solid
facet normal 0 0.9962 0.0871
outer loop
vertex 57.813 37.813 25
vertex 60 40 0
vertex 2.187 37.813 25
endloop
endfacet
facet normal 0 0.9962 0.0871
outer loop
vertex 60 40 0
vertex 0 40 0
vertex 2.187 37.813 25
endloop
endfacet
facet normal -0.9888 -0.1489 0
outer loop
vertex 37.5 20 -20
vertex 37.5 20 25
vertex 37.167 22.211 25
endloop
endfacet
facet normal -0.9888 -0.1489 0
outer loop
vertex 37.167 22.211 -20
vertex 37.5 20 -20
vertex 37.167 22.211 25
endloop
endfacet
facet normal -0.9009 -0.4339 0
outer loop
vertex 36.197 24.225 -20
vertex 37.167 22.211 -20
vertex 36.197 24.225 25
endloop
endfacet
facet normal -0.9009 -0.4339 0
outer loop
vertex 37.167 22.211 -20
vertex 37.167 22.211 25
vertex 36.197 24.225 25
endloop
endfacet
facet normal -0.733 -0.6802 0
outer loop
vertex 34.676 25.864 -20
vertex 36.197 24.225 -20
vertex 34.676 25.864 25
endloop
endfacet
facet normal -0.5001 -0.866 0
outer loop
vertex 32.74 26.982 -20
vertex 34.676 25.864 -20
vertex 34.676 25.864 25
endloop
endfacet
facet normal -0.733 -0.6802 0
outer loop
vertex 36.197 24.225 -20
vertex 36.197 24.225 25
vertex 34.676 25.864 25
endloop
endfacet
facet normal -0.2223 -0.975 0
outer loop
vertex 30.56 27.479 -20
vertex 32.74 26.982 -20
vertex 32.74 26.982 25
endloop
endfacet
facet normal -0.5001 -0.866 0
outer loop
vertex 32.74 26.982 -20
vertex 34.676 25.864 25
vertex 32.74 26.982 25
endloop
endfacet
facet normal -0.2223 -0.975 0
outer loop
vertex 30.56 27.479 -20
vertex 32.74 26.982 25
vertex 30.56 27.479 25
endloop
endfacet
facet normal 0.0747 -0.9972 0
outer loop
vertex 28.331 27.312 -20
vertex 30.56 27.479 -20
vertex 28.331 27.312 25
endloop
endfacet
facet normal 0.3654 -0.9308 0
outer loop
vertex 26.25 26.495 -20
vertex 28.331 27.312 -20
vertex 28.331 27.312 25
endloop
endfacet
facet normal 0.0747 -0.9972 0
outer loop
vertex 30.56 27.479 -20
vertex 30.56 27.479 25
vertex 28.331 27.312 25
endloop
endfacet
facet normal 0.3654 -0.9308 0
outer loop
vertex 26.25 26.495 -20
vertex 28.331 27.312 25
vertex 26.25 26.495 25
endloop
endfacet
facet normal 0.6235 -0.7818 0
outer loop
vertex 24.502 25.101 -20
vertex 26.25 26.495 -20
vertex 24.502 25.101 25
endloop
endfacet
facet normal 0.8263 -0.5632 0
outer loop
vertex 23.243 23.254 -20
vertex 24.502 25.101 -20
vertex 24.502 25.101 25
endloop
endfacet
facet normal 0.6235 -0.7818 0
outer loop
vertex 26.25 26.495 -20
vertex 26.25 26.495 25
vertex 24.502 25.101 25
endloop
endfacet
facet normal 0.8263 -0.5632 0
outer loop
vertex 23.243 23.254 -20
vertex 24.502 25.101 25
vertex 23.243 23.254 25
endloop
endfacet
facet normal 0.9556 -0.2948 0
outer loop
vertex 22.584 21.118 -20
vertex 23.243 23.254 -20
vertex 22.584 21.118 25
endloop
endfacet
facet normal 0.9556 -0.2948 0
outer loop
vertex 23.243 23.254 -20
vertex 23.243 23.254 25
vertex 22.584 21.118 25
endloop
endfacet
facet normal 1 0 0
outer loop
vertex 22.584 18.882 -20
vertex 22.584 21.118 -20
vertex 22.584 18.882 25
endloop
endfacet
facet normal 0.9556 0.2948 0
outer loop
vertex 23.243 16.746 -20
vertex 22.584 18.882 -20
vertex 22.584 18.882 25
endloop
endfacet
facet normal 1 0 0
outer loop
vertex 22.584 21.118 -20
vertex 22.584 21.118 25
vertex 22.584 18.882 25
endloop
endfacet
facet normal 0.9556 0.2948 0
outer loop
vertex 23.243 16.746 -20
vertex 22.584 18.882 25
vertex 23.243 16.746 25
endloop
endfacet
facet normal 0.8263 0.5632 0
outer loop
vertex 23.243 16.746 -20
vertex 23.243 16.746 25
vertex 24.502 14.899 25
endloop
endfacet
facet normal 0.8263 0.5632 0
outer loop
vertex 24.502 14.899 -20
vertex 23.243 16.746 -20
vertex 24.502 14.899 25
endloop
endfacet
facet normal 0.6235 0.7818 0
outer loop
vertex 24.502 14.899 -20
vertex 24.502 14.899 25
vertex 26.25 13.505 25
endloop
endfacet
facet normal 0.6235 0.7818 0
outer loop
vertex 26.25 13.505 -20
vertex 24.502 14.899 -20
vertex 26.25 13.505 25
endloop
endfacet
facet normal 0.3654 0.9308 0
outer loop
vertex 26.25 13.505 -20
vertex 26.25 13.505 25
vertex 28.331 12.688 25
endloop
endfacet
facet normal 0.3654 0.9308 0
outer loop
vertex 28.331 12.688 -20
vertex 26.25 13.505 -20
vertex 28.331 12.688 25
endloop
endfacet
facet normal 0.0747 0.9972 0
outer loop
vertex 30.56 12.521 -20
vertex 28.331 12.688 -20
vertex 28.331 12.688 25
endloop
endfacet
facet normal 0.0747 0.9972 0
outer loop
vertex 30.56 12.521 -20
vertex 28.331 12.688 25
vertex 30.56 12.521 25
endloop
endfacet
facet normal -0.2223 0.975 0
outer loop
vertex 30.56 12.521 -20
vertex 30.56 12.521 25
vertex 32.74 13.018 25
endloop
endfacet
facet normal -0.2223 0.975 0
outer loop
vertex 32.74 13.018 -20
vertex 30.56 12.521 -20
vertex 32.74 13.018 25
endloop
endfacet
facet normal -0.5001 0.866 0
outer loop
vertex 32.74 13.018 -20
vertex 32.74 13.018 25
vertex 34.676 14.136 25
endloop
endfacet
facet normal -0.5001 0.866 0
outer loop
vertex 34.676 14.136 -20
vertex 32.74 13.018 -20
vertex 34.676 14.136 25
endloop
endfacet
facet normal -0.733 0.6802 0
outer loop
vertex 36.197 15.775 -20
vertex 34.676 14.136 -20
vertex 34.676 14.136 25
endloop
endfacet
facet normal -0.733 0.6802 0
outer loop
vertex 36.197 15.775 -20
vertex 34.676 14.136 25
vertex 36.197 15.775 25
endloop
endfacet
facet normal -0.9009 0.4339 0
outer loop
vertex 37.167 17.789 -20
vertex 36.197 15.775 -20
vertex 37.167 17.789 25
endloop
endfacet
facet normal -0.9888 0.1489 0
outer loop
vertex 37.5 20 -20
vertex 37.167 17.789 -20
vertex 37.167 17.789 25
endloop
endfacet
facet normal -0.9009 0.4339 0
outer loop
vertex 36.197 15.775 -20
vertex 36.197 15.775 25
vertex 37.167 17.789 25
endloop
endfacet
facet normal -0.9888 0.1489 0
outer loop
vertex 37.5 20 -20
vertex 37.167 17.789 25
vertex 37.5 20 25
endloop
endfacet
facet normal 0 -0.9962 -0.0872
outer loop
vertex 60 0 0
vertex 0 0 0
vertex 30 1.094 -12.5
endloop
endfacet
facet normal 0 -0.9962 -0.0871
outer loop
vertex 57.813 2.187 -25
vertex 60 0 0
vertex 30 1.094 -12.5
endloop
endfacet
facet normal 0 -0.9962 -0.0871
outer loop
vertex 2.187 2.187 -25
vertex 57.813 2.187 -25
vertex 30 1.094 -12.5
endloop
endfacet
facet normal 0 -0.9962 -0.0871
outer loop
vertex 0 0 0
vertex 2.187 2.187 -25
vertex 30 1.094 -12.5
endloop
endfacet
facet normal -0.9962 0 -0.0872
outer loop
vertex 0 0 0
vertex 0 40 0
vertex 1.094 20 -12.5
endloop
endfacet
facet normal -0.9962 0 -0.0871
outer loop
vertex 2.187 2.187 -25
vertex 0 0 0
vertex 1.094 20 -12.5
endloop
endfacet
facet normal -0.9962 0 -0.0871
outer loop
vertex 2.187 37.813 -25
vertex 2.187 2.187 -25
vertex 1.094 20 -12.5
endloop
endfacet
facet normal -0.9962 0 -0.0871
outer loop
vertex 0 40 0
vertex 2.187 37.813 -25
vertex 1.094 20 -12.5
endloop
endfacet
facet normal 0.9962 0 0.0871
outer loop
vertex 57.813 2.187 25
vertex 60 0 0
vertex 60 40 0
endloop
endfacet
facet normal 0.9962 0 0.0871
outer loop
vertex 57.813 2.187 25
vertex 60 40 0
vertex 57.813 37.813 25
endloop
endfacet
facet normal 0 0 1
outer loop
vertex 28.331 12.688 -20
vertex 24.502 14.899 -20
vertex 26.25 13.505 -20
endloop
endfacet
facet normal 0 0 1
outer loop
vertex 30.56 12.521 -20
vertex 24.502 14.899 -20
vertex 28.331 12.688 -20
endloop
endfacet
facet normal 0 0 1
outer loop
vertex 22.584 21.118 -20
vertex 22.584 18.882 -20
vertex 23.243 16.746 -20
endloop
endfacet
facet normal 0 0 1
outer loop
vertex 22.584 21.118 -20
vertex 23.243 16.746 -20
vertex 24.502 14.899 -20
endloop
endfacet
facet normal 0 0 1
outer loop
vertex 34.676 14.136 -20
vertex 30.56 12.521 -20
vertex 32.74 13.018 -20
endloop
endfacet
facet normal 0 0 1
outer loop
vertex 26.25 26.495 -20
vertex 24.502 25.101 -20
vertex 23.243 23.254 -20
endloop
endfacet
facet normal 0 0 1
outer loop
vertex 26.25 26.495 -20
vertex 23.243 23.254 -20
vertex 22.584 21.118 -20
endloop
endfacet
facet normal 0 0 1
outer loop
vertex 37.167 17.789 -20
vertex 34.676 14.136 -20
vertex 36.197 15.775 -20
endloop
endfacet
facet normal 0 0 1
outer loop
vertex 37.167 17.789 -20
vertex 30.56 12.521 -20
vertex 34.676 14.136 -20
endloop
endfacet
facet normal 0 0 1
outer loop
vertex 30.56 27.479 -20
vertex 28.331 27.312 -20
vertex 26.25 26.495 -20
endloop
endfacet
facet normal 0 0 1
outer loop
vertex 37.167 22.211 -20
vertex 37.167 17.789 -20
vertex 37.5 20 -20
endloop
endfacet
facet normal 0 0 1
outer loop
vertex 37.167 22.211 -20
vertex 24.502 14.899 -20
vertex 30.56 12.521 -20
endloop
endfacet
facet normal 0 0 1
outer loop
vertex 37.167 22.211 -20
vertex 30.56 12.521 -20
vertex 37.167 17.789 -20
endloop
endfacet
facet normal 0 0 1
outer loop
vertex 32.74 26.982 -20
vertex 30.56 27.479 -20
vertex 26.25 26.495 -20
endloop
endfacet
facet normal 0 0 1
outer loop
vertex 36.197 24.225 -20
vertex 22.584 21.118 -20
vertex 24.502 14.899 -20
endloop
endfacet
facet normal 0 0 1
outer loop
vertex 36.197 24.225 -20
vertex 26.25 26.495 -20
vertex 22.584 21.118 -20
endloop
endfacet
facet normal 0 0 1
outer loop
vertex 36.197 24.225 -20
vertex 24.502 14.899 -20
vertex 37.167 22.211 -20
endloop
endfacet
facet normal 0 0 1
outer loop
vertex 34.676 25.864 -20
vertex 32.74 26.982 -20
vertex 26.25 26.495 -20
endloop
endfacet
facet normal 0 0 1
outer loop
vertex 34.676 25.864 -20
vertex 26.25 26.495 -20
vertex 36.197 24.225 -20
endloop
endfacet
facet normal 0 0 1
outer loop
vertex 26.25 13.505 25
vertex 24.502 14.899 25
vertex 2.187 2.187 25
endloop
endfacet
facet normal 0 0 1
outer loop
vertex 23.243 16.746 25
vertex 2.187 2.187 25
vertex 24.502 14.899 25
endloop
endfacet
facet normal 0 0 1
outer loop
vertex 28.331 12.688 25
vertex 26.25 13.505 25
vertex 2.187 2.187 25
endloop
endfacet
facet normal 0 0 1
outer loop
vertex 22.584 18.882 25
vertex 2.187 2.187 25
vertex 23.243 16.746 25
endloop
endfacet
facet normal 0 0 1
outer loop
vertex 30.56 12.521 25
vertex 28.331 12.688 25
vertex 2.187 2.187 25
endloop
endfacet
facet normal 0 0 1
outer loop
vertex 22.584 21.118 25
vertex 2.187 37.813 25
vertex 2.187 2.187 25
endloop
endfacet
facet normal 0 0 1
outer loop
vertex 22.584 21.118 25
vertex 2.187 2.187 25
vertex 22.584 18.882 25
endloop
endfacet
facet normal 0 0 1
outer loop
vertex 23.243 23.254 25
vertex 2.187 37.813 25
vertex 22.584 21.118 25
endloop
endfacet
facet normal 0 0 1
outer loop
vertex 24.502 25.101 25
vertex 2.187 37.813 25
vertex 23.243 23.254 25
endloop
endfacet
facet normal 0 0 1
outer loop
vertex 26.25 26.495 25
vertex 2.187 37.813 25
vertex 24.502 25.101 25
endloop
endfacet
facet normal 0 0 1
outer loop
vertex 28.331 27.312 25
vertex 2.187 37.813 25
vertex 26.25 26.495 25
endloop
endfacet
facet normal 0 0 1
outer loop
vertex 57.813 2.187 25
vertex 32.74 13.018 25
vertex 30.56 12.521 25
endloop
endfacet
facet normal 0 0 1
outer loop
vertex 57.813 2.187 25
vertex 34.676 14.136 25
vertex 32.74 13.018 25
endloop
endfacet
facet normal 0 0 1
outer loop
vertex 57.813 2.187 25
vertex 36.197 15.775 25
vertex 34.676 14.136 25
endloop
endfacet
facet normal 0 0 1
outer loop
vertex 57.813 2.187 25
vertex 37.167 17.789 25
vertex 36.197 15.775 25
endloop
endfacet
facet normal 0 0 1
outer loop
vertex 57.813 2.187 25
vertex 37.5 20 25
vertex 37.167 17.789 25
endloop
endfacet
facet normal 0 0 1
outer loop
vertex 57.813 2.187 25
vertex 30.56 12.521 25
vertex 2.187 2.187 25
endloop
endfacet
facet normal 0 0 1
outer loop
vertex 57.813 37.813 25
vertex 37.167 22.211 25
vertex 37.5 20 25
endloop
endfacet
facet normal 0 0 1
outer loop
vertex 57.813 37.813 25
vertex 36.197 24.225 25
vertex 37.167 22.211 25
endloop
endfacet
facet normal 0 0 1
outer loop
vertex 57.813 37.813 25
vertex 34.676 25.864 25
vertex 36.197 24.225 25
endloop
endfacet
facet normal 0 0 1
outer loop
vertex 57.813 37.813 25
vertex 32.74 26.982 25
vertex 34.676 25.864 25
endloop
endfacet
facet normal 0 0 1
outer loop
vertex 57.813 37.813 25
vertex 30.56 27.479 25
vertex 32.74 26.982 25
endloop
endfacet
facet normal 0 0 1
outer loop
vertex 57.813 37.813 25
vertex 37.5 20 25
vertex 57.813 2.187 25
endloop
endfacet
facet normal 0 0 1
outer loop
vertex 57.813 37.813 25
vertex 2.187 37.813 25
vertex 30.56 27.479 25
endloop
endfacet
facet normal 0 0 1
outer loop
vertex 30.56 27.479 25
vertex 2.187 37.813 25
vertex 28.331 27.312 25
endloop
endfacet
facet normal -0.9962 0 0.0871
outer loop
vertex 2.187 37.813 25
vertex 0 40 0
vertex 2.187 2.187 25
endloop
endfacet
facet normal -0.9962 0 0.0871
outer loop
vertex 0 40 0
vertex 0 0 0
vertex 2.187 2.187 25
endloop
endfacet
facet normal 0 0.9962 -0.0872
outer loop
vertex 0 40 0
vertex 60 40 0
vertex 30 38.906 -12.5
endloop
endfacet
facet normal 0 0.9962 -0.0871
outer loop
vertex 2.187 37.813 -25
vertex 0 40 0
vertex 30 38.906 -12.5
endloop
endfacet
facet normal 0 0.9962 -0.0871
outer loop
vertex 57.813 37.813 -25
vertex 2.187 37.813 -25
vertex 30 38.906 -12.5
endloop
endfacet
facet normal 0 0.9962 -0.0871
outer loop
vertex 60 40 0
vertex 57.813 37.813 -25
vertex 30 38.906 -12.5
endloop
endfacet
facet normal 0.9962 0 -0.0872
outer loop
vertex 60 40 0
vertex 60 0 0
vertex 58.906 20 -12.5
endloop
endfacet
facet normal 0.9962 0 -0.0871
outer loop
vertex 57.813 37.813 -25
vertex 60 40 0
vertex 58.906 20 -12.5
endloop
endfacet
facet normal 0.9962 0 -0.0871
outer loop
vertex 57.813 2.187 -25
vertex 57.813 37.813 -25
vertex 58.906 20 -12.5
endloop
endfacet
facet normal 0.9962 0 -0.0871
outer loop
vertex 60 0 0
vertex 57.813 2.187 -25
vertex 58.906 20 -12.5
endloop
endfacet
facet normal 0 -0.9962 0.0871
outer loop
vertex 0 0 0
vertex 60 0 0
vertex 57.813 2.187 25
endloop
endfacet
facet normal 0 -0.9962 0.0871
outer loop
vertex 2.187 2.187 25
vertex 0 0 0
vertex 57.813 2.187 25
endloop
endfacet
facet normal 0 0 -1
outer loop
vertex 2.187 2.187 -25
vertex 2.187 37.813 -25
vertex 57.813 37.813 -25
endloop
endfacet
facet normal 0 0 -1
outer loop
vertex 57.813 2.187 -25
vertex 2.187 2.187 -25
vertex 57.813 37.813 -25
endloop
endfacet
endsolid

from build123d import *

# Parameters (mm, degrees)
F0_W          = 60
F0_H          = 40
F1_DEPTH      = 25
F1_TAPER      = 5
F1_DEPTH_BACK = 25
F1_TAPER_BACK = 5
F2_R          = 7.5
F3_DEPTH      = 45


with BuildPart() as f1:
    # F0 (on Top) → F1 (new body, two sides)
    with BuildSketch(Plane.XY) as f1_sk:
        with Locations((30, 20)):
            Rectangle(F0_W, F0_H)
    extrude(amount=F1_DEPTH, taper=F1_TAPER)
    extrude(f1_sk.sketch, amount=-F1_DEPTH_BACK, taper=F1_TAPER_BACK)

    # F2 (on face) → F3 (cut)
    with BuildSketch(Plane.XY.offset(25)):
        with Locations((30, 20)):
            Circle(F2_R)
    extrude(amount=-F3_DEPTH, mode=Mode.SUBTRACT)


solid = f1.part
